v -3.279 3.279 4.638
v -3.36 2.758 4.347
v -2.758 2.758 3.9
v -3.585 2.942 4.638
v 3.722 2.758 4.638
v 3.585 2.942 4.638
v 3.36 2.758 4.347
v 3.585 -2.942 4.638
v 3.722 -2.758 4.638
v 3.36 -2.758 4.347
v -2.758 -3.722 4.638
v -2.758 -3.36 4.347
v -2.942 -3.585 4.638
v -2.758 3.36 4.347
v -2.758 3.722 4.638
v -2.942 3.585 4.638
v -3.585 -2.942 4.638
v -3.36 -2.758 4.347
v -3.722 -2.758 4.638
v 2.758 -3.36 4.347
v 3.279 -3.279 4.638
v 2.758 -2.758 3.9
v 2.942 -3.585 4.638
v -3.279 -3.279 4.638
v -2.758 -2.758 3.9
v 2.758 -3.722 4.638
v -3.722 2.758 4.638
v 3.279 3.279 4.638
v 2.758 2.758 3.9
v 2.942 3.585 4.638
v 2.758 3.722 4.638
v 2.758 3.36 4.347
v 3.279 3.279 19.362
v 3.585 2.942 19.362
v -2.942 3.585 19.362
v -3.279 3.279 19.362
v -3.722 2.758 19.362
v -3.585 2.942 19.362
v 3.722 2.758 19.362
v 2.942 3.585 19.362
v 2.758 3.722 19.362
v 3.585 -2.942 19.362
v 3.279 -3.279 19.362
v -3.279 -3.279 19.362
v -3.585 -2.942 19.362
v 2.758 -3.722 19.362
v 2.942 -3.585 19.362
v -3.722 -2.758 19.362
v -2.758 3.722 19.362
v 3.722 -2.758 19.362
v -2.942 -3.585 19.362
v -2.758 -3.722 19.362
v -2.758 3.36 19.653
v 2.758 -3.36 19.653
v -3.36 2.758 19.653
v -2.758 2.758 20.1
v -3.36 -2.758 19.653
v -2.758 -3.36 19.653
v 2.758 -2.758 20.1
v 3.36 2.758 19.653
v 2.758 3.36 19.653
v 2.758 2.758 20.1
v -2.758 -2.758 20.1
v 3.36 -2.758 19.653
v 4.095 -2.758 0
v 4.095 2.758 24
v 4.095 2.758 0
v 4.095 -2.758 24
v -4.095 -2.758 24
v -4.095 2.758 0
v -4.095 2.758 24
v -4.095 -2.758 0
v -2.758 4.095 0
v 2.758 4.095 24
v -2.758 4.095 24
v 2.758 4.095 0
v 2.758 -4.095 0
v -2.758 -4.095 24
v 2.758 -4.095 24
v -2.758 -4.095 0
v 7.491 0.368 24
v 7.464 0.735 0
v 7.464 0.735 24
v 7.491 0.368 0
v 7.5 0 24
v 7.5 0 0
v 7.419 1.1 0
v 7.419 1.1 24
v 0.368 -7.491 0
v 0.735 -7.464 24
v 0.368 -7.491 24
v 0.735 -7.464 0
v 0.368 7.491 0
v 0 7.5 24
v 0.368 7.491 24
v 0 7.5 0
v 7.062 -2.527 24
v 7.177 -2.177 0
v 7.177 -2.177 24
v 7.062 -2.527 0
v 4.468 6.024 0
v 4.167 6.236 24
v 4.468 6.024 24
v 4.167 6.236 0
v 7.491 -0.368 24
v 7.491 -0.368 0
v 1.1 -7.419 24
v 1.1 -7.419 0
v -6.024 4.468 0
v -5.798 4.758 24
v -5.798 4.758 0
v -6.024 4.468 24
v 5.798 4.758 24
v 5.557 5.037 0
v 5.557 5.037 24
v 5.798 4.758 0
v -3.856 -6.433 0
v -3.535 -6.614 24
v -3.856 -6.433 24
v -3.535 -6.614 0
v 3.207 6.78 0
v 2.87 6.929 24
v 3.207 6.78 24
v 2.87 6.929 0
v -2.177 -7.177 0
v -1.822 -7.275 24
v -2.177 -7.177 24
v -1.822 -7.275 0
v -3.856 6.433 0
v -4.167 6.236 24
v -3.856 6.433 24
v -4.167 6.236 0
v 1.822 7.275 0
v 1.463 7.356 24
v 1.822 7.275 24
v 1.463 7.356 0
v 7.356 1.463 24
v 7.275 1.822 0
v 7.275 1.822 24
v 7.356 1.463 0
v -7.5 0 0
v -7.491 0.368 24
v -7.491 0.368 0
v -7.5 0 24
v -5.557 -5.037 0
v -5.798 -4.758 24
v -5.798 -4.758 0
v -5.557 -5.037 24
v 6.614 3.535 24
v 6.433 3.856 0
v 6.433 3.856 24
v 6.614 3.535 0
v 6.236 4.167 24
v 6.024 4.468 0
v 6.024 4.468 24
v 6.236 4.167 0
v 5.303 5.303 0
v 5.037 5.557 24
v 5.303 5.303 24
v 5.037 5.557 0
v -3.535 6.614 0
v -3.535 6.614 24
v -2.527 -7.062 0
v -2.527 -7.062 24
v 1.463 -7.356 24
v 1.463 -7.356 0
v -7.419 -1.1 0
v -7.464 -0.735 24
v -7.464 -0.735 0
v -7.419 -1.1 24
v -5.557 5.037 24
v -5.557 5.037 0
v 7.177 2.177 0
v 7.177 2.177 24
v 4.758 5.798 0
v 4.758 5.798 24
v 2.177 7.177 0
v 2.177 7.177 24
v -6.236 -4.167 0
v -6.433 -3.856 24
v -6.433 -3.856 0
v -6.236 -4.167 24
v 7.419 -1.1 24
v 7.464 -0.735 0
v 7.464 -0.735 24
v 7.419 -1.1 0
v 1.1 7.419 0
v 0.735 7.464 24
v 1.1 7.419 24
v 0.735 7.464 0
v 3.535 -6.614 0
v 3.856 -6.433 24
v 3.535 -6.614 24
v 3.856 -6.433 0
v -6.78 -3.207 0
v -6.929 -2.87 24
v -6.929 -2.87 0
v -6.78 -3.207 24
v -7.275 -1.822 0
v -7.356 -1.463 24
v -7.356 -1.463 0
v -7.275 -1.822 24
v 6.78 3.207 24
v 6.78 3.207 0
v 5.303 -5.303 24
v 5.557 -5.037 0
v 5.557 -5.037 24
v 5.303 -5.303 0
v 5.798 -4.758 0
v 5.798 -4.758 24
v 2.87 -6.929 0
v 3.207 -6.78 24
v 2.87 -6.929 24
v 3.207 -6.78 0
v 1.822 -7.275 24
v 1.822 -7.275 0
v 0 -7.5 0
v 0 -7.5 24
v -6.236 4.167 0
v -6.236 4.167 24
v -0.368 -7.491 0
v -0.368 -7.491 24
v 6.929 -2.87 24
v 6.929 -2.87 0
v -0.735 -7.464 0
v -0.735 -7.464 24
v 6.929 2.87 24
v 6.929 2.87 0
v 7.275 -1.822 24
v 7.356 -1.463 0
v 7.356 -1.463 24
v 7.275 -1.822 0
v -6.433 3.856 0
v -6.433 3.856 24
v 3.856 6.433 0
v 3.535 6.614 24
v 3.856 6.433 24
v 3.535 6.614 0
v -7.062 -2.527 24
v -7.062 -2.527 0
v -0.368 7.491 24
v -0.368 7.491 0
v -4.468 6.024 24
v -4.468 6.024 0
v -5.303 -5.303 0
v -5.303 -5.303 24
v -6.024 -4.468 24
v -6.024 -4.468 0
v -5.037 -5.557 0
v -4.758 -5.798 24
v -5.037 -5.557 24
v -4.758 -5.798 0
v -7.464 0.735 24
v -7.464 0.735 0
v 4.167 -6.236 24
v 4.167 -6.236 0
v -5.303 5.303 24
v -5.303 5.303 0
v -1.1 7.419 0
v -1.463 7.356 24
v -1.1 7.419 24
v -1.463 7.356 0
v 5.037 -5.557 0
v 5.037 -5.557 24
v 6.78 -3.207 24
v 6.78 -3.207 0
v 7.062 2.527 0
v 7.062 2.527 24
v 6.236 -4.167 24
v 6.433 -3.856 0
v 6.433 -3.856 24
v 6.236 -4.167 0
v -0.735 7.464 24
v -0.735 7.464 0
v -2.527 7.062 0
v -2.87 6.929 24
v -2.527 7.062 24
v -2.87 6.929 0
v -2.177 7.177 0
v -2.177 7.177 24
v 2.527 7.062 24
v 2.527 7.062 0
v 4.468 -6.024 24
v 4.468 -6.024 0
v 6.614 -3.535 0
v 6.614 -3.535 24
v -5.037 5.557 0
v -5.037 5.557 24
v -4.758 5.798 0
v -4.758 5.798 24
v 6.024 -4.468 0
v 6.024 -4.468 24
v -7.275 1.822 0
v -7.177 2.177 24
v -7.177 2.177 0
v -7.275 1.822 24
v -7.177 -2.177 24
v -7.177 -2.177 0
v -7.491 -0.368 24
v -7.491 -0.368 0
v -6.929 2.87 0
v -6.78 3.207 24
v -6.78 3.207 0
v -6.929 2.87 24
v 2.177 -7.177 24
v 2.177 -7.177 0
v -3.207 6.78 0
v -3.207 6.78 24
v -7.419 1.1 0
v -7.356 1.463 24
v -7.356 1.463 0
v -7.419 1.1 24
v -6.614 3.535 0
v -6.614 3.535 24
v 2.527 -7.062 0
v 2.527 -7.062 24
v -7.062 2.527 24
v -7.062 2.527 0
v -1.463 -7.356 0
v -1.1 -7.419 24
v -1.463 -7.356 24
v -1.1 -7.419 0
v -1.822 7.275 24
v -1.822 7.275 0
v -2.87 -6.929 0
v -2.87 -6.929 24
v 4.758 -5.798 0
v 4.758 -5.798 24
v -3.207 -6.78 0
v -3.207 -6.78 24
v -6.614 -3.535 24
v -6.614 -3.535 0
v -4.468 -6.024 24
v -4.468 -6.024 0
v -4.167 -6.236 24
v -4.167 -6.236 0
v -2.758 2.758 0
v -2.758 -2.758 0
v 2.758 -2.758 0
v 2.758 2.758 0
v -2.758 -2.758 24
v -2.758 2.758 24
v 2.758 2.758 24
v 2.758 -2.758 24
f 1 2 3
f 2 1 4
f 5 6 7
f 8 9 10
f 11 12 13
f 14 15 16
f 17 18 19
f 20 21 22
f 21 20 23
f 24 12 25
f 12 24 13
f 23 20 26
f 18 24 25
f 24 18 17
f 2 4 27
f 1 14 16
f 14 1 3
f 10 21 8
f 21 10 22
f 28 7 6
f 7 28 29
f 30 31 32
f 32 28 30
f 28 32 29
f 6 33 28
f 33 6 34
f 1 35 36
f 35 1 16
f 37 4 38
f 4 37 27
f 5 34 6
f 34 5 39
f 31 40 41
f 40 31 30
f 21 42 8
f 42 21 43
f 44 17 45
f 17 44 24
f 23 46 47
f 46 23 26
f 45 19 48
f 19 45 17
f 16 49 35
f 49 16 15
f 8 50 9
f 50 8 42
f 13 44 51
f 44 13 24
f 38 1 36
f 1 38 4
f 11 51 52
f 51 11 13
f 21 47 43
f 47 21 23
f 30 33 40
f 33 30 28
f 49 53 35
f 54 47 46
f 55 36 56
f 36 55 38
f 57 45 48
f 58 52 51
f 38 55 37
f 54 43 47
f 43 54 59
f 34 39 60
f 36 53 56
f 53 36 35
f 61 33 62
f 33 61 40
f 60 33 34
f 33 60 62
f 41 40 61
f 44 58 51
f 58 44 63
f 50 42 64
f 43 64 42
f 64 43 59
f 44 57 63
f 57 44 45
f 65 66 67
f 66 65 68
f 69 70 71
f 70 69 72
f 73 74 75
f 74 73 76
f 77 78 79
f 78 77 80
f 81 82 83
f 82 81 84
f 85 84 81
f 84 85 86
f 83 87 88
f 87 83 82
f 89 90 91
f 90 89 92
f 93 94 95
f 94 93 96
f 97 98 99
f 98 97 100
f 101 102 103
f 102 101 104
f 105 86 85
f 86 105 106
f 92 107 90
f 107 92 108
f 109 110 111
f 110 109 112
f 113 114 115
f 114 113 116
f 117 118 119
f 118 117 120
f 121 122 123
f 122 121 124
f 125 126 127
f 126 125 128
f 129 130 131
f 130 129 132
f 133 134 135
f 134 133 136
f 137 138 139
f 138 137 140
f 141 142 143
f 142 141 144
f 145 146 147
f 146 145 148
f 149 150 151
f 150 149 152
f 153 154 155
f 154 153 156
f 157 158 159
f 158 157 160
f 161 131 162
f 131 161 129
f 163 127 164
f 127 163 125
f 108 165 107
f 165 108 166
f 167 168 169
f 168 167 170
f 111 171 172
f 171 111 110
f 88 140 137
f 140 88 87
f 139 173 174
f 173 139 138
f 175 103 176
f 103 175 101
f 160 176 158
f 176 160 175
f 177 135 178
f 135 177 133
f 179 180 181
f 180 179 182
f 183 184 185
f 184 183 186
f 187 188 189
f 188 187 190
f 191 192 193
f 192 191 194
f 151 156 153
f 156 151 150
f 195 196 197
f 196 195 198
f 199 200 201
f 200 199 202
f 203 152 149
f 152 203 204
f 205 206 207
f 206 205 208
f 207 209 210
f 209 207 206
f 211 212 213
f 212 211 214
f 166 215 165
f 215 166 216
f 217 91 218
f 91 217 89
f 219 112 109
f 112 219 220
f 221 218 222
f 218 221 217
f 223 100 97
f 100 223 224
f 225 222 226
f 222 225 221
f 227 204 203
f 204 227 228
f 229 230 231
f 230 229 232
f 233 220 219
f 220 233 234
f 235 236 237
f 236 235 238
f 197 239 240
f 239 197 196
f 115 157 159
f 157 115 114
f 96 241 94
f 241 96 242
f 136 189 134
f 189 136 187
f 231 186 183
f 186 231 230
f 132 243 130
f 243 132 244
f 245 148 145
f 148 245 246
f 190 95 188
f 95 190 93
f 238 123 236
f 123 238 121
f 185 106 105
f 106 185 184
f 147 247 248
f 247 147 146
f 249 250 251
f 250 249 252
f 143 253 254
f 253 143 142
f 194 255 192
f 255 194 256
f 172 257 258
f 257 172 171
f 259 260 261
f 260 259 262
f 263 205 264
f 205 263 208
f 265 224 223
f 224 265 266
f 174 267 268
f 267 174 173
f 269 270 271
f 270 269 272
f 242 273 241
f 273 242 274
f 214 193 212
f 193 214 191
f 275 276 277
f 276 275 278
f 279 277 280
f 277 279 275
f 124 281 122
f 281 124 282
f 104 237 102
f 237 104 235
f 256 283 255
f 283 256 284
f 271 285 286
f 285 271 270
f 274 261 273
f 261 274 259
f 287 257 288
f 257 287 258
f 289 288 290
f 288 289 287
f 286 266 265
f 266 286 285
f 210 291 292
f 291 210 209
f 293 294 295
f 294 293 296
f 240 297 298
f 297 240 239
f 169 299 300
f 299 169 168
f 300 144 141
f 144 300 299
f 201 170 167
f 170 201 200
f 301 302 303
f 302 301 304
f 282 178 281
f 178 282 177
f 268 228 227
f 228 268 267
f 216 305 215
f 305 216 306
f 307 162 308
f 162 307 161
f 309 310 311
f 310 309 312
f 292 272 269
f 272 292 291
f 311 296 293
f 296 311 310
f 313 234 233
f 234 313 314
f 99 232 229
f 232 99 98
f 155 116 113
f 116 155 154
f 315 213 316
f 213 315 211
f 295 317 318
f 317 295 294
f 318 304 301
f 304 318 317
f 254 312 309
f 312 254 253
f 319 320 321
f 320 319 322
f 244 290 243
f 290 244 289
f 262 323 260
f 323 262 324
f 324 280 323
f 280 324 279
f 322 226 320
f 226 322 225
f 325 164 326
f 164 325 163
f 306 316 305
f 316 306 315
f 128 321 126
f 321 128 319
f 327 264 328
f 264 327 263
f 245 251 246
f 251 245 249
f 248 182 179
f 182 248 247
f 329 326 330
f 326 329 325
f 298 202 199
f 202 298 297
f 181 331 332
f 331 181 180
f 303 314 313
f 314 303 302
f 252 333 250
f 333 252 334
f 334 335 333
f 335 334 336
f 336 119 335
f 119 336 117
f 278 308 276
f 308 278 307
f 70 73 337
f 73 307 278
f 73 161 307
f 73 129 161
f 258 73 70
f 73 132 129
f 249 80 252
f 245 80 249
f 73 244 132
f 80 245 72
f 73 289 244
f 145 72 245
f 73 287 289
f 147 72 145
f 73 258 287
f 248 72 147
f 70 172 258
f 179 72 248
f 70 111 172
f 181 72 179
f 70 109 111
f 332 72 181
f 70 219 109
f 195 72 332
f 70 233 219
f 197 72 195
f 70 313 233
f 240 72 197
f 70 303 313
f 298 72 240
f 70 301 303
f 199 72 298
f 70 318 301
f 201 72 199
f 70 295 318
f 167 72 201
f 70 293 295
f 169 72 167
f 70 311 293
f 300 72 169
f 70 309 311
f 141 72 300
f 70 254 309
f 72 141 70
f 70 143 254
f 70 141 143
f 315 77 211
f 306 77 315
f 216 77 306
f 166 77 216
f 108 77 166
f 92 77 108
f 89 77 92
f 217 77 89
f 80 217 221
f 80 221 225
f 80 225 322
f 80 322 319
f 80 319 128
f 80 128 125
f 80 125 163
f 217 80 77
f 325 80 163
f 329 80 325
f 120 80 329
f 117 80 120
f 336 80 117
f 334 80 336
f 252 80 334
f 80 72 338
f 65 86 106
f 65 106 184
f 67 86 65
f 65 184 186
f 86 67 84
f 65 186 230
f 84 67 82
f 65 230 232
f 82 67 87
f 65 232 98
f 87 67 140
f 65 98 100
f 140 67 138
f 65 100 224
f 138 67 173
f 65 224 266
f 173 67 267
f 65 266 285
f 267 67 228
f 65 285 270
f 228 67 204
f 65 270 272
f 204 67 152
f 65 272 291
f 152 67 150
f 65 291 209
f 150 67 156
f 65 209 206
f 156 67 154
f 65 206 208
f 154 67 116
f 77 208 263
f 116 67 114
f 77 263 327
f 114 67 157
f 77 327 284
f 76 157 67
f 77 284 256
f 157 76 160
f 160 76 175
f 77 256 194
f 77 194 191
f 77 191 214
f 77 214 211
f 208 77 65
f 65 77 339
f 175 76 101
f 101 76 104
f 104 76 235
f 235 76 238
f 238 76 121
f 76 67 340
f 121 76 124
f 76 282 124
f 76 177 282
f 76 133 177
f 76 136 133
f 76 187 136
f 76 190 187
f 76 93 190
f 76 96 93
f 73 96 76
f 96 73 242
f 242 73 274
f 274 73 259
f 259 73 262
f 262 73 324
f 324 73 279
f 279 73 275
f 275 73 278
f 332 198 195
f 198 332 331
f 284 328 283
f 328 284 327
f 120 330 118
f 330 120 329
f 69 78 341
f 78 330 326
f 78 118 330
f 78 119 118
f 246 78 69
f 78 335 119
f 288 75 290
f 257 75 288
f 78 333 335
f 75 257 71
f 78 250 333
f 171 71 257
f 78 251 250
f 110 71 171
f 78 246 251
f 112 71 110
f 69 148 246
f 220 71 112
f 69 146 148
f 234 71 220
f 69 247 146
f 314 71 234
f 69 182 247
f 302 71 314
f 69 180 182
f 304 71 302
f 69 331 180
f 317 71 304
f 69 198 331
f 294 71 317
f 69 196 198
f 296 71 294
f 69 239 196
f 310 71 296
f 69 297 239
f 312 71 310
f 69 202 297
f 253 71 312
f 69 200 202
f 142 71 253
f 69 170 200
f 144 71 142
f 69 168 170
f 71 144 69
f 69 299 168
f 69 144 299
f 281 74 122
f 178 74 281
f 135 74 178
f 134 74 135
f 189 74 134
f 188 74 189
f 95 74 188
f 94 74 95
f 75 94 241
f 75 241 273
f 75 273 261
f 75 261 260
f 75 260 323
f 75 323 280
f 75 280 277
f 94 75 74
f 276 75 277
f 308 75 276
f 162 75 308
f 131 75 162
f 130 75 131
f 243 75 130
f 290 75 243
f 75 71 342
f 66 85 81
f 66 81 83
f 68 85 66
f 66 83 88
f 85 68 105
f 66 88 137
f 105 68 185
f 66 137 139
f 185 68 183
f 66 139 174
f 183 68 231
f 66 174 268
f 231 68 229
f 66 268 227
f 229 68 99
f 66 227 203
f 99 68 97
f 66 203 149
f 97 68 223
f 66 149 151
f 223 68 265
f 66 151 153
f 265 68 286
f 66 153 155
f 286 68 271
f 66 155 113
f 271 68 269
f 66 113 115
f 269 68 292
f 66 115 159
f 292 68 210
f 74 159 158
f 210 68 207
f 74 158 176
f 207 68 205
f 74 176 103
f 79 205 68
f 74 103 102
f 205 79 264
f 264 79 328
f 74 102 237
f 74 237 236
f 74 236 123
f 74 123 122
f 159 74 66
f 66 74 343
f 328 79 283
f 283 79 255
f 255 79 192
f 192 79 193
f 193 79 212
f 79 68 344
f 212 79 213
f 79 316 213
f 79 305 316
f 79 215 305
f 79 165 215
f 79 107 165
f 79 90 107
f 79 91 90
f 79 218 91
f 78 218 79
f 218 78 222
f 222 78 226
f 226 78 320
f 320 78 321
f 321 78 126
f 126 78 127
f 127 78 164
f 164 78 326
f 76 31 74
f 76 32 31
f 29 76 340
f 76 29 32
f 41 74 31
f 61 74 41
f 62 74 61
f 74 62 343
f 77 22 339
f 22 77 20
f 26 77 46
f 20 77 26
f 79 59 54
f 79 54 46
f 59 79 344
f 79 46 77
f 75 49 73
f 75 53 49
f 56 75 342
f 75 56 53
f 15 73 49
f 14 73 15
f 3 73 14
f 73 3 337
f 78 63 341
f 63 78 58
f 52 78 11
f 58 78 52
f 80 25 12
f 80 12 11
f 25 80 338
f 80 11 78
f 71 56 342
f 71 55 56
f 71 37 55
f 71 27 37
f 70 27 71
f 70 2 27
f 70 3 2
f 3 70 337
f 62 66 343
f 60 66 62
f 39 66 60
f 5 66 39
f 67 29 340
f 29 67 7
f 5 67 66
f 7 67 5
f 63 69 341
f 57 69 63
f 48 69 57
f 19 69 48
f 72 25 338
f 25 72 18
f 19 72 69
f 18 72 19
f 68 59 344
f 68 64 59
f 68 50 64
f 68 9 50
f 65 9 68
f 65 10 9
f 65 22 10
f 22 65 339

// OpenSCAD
// Thanks for this one to Triffid Hunter!!

// PRUSA Mendel  
// Printable LM8UU bushing
// GNU GPL v3
// Josef Průša
// josefprusa@me.com
// prusadjs.cz
// http://www.reprap.org/wiki/Prusa_Mendel
// http://github.com/prusajr/PrusaMendel

lm8uu_od = 15;
lm8uu_l = 24;
lm8uu_id = 7.8;

clearance_ratio = 1.05;

contact_length = 4;

cutout_width = lm8uu_id / sqrt(2);

%translate([0, 0, -lm8uu_l]) cylinder(r = lm8uu_id / 2, h=lm8uu_l * 3, $fn=256);
difference() {
	cylinder(r=lm8uu_od / 2, h=lm8uu_l, $fn=128);
	// corner cutouts
	translate([-cutout_width / 2, -lm8uu_id * clearance_ratio / 2, -1])
		cube([cutout_width, lm8uu_id * clearance_ratio, lm8uu_l + 2]);
	translate([-lm8uu_id * clearance_ratio / 2, -cutout_width / 2, -1])
		cube([lm8uu_id * clearance_ratio, cutout_width, lm8uu_l + 2]);
	// negative cylindrical shuttle for contact area
	intersection() {
		translate([-lm8uu_id * clearance_ratio /  2, -lm8uu_id * clearance_ratio / 2, -1]) cube([lm8uu_id * clearance_ratio, lm8uu_id * clearance_ratio, lm8uu_l + 2]);
		union() {
			cylinder(r1 = 0, r2 = lm8uu_id * sqrt(sqrt(2)) / 2, h = lm8uu_id * sqrt(sqrt(2)) / 2, $fn=64);
			translate([0, 0, lm8uu_id * sqrt(sqrt(2)) / 2])
				cylinder(r = lm8uu_id * sqrt(sqrt(2)) / 2, h = lm8uu_l - (lm8uu_id * sqrt(sqrt(2))), $fn=64);
			translate([0, 0, lm8uu_id * sqrt(sqrt(2)) / 2 + lm8uu_l - (lm8uu_id * sqrt(sqrt(2)))])
				cylinder(r1 = lm8uu_id * sqrt(sqrt(2)) / 2, r2 = 0, h = lm8uu_id * sqrt(sqrt(2)) / 2, $fn=64);
		}
	}
	// cutout for viewing internal structure
	//translate([0, 0, -1]) cube([20, 20, 30]);
}
